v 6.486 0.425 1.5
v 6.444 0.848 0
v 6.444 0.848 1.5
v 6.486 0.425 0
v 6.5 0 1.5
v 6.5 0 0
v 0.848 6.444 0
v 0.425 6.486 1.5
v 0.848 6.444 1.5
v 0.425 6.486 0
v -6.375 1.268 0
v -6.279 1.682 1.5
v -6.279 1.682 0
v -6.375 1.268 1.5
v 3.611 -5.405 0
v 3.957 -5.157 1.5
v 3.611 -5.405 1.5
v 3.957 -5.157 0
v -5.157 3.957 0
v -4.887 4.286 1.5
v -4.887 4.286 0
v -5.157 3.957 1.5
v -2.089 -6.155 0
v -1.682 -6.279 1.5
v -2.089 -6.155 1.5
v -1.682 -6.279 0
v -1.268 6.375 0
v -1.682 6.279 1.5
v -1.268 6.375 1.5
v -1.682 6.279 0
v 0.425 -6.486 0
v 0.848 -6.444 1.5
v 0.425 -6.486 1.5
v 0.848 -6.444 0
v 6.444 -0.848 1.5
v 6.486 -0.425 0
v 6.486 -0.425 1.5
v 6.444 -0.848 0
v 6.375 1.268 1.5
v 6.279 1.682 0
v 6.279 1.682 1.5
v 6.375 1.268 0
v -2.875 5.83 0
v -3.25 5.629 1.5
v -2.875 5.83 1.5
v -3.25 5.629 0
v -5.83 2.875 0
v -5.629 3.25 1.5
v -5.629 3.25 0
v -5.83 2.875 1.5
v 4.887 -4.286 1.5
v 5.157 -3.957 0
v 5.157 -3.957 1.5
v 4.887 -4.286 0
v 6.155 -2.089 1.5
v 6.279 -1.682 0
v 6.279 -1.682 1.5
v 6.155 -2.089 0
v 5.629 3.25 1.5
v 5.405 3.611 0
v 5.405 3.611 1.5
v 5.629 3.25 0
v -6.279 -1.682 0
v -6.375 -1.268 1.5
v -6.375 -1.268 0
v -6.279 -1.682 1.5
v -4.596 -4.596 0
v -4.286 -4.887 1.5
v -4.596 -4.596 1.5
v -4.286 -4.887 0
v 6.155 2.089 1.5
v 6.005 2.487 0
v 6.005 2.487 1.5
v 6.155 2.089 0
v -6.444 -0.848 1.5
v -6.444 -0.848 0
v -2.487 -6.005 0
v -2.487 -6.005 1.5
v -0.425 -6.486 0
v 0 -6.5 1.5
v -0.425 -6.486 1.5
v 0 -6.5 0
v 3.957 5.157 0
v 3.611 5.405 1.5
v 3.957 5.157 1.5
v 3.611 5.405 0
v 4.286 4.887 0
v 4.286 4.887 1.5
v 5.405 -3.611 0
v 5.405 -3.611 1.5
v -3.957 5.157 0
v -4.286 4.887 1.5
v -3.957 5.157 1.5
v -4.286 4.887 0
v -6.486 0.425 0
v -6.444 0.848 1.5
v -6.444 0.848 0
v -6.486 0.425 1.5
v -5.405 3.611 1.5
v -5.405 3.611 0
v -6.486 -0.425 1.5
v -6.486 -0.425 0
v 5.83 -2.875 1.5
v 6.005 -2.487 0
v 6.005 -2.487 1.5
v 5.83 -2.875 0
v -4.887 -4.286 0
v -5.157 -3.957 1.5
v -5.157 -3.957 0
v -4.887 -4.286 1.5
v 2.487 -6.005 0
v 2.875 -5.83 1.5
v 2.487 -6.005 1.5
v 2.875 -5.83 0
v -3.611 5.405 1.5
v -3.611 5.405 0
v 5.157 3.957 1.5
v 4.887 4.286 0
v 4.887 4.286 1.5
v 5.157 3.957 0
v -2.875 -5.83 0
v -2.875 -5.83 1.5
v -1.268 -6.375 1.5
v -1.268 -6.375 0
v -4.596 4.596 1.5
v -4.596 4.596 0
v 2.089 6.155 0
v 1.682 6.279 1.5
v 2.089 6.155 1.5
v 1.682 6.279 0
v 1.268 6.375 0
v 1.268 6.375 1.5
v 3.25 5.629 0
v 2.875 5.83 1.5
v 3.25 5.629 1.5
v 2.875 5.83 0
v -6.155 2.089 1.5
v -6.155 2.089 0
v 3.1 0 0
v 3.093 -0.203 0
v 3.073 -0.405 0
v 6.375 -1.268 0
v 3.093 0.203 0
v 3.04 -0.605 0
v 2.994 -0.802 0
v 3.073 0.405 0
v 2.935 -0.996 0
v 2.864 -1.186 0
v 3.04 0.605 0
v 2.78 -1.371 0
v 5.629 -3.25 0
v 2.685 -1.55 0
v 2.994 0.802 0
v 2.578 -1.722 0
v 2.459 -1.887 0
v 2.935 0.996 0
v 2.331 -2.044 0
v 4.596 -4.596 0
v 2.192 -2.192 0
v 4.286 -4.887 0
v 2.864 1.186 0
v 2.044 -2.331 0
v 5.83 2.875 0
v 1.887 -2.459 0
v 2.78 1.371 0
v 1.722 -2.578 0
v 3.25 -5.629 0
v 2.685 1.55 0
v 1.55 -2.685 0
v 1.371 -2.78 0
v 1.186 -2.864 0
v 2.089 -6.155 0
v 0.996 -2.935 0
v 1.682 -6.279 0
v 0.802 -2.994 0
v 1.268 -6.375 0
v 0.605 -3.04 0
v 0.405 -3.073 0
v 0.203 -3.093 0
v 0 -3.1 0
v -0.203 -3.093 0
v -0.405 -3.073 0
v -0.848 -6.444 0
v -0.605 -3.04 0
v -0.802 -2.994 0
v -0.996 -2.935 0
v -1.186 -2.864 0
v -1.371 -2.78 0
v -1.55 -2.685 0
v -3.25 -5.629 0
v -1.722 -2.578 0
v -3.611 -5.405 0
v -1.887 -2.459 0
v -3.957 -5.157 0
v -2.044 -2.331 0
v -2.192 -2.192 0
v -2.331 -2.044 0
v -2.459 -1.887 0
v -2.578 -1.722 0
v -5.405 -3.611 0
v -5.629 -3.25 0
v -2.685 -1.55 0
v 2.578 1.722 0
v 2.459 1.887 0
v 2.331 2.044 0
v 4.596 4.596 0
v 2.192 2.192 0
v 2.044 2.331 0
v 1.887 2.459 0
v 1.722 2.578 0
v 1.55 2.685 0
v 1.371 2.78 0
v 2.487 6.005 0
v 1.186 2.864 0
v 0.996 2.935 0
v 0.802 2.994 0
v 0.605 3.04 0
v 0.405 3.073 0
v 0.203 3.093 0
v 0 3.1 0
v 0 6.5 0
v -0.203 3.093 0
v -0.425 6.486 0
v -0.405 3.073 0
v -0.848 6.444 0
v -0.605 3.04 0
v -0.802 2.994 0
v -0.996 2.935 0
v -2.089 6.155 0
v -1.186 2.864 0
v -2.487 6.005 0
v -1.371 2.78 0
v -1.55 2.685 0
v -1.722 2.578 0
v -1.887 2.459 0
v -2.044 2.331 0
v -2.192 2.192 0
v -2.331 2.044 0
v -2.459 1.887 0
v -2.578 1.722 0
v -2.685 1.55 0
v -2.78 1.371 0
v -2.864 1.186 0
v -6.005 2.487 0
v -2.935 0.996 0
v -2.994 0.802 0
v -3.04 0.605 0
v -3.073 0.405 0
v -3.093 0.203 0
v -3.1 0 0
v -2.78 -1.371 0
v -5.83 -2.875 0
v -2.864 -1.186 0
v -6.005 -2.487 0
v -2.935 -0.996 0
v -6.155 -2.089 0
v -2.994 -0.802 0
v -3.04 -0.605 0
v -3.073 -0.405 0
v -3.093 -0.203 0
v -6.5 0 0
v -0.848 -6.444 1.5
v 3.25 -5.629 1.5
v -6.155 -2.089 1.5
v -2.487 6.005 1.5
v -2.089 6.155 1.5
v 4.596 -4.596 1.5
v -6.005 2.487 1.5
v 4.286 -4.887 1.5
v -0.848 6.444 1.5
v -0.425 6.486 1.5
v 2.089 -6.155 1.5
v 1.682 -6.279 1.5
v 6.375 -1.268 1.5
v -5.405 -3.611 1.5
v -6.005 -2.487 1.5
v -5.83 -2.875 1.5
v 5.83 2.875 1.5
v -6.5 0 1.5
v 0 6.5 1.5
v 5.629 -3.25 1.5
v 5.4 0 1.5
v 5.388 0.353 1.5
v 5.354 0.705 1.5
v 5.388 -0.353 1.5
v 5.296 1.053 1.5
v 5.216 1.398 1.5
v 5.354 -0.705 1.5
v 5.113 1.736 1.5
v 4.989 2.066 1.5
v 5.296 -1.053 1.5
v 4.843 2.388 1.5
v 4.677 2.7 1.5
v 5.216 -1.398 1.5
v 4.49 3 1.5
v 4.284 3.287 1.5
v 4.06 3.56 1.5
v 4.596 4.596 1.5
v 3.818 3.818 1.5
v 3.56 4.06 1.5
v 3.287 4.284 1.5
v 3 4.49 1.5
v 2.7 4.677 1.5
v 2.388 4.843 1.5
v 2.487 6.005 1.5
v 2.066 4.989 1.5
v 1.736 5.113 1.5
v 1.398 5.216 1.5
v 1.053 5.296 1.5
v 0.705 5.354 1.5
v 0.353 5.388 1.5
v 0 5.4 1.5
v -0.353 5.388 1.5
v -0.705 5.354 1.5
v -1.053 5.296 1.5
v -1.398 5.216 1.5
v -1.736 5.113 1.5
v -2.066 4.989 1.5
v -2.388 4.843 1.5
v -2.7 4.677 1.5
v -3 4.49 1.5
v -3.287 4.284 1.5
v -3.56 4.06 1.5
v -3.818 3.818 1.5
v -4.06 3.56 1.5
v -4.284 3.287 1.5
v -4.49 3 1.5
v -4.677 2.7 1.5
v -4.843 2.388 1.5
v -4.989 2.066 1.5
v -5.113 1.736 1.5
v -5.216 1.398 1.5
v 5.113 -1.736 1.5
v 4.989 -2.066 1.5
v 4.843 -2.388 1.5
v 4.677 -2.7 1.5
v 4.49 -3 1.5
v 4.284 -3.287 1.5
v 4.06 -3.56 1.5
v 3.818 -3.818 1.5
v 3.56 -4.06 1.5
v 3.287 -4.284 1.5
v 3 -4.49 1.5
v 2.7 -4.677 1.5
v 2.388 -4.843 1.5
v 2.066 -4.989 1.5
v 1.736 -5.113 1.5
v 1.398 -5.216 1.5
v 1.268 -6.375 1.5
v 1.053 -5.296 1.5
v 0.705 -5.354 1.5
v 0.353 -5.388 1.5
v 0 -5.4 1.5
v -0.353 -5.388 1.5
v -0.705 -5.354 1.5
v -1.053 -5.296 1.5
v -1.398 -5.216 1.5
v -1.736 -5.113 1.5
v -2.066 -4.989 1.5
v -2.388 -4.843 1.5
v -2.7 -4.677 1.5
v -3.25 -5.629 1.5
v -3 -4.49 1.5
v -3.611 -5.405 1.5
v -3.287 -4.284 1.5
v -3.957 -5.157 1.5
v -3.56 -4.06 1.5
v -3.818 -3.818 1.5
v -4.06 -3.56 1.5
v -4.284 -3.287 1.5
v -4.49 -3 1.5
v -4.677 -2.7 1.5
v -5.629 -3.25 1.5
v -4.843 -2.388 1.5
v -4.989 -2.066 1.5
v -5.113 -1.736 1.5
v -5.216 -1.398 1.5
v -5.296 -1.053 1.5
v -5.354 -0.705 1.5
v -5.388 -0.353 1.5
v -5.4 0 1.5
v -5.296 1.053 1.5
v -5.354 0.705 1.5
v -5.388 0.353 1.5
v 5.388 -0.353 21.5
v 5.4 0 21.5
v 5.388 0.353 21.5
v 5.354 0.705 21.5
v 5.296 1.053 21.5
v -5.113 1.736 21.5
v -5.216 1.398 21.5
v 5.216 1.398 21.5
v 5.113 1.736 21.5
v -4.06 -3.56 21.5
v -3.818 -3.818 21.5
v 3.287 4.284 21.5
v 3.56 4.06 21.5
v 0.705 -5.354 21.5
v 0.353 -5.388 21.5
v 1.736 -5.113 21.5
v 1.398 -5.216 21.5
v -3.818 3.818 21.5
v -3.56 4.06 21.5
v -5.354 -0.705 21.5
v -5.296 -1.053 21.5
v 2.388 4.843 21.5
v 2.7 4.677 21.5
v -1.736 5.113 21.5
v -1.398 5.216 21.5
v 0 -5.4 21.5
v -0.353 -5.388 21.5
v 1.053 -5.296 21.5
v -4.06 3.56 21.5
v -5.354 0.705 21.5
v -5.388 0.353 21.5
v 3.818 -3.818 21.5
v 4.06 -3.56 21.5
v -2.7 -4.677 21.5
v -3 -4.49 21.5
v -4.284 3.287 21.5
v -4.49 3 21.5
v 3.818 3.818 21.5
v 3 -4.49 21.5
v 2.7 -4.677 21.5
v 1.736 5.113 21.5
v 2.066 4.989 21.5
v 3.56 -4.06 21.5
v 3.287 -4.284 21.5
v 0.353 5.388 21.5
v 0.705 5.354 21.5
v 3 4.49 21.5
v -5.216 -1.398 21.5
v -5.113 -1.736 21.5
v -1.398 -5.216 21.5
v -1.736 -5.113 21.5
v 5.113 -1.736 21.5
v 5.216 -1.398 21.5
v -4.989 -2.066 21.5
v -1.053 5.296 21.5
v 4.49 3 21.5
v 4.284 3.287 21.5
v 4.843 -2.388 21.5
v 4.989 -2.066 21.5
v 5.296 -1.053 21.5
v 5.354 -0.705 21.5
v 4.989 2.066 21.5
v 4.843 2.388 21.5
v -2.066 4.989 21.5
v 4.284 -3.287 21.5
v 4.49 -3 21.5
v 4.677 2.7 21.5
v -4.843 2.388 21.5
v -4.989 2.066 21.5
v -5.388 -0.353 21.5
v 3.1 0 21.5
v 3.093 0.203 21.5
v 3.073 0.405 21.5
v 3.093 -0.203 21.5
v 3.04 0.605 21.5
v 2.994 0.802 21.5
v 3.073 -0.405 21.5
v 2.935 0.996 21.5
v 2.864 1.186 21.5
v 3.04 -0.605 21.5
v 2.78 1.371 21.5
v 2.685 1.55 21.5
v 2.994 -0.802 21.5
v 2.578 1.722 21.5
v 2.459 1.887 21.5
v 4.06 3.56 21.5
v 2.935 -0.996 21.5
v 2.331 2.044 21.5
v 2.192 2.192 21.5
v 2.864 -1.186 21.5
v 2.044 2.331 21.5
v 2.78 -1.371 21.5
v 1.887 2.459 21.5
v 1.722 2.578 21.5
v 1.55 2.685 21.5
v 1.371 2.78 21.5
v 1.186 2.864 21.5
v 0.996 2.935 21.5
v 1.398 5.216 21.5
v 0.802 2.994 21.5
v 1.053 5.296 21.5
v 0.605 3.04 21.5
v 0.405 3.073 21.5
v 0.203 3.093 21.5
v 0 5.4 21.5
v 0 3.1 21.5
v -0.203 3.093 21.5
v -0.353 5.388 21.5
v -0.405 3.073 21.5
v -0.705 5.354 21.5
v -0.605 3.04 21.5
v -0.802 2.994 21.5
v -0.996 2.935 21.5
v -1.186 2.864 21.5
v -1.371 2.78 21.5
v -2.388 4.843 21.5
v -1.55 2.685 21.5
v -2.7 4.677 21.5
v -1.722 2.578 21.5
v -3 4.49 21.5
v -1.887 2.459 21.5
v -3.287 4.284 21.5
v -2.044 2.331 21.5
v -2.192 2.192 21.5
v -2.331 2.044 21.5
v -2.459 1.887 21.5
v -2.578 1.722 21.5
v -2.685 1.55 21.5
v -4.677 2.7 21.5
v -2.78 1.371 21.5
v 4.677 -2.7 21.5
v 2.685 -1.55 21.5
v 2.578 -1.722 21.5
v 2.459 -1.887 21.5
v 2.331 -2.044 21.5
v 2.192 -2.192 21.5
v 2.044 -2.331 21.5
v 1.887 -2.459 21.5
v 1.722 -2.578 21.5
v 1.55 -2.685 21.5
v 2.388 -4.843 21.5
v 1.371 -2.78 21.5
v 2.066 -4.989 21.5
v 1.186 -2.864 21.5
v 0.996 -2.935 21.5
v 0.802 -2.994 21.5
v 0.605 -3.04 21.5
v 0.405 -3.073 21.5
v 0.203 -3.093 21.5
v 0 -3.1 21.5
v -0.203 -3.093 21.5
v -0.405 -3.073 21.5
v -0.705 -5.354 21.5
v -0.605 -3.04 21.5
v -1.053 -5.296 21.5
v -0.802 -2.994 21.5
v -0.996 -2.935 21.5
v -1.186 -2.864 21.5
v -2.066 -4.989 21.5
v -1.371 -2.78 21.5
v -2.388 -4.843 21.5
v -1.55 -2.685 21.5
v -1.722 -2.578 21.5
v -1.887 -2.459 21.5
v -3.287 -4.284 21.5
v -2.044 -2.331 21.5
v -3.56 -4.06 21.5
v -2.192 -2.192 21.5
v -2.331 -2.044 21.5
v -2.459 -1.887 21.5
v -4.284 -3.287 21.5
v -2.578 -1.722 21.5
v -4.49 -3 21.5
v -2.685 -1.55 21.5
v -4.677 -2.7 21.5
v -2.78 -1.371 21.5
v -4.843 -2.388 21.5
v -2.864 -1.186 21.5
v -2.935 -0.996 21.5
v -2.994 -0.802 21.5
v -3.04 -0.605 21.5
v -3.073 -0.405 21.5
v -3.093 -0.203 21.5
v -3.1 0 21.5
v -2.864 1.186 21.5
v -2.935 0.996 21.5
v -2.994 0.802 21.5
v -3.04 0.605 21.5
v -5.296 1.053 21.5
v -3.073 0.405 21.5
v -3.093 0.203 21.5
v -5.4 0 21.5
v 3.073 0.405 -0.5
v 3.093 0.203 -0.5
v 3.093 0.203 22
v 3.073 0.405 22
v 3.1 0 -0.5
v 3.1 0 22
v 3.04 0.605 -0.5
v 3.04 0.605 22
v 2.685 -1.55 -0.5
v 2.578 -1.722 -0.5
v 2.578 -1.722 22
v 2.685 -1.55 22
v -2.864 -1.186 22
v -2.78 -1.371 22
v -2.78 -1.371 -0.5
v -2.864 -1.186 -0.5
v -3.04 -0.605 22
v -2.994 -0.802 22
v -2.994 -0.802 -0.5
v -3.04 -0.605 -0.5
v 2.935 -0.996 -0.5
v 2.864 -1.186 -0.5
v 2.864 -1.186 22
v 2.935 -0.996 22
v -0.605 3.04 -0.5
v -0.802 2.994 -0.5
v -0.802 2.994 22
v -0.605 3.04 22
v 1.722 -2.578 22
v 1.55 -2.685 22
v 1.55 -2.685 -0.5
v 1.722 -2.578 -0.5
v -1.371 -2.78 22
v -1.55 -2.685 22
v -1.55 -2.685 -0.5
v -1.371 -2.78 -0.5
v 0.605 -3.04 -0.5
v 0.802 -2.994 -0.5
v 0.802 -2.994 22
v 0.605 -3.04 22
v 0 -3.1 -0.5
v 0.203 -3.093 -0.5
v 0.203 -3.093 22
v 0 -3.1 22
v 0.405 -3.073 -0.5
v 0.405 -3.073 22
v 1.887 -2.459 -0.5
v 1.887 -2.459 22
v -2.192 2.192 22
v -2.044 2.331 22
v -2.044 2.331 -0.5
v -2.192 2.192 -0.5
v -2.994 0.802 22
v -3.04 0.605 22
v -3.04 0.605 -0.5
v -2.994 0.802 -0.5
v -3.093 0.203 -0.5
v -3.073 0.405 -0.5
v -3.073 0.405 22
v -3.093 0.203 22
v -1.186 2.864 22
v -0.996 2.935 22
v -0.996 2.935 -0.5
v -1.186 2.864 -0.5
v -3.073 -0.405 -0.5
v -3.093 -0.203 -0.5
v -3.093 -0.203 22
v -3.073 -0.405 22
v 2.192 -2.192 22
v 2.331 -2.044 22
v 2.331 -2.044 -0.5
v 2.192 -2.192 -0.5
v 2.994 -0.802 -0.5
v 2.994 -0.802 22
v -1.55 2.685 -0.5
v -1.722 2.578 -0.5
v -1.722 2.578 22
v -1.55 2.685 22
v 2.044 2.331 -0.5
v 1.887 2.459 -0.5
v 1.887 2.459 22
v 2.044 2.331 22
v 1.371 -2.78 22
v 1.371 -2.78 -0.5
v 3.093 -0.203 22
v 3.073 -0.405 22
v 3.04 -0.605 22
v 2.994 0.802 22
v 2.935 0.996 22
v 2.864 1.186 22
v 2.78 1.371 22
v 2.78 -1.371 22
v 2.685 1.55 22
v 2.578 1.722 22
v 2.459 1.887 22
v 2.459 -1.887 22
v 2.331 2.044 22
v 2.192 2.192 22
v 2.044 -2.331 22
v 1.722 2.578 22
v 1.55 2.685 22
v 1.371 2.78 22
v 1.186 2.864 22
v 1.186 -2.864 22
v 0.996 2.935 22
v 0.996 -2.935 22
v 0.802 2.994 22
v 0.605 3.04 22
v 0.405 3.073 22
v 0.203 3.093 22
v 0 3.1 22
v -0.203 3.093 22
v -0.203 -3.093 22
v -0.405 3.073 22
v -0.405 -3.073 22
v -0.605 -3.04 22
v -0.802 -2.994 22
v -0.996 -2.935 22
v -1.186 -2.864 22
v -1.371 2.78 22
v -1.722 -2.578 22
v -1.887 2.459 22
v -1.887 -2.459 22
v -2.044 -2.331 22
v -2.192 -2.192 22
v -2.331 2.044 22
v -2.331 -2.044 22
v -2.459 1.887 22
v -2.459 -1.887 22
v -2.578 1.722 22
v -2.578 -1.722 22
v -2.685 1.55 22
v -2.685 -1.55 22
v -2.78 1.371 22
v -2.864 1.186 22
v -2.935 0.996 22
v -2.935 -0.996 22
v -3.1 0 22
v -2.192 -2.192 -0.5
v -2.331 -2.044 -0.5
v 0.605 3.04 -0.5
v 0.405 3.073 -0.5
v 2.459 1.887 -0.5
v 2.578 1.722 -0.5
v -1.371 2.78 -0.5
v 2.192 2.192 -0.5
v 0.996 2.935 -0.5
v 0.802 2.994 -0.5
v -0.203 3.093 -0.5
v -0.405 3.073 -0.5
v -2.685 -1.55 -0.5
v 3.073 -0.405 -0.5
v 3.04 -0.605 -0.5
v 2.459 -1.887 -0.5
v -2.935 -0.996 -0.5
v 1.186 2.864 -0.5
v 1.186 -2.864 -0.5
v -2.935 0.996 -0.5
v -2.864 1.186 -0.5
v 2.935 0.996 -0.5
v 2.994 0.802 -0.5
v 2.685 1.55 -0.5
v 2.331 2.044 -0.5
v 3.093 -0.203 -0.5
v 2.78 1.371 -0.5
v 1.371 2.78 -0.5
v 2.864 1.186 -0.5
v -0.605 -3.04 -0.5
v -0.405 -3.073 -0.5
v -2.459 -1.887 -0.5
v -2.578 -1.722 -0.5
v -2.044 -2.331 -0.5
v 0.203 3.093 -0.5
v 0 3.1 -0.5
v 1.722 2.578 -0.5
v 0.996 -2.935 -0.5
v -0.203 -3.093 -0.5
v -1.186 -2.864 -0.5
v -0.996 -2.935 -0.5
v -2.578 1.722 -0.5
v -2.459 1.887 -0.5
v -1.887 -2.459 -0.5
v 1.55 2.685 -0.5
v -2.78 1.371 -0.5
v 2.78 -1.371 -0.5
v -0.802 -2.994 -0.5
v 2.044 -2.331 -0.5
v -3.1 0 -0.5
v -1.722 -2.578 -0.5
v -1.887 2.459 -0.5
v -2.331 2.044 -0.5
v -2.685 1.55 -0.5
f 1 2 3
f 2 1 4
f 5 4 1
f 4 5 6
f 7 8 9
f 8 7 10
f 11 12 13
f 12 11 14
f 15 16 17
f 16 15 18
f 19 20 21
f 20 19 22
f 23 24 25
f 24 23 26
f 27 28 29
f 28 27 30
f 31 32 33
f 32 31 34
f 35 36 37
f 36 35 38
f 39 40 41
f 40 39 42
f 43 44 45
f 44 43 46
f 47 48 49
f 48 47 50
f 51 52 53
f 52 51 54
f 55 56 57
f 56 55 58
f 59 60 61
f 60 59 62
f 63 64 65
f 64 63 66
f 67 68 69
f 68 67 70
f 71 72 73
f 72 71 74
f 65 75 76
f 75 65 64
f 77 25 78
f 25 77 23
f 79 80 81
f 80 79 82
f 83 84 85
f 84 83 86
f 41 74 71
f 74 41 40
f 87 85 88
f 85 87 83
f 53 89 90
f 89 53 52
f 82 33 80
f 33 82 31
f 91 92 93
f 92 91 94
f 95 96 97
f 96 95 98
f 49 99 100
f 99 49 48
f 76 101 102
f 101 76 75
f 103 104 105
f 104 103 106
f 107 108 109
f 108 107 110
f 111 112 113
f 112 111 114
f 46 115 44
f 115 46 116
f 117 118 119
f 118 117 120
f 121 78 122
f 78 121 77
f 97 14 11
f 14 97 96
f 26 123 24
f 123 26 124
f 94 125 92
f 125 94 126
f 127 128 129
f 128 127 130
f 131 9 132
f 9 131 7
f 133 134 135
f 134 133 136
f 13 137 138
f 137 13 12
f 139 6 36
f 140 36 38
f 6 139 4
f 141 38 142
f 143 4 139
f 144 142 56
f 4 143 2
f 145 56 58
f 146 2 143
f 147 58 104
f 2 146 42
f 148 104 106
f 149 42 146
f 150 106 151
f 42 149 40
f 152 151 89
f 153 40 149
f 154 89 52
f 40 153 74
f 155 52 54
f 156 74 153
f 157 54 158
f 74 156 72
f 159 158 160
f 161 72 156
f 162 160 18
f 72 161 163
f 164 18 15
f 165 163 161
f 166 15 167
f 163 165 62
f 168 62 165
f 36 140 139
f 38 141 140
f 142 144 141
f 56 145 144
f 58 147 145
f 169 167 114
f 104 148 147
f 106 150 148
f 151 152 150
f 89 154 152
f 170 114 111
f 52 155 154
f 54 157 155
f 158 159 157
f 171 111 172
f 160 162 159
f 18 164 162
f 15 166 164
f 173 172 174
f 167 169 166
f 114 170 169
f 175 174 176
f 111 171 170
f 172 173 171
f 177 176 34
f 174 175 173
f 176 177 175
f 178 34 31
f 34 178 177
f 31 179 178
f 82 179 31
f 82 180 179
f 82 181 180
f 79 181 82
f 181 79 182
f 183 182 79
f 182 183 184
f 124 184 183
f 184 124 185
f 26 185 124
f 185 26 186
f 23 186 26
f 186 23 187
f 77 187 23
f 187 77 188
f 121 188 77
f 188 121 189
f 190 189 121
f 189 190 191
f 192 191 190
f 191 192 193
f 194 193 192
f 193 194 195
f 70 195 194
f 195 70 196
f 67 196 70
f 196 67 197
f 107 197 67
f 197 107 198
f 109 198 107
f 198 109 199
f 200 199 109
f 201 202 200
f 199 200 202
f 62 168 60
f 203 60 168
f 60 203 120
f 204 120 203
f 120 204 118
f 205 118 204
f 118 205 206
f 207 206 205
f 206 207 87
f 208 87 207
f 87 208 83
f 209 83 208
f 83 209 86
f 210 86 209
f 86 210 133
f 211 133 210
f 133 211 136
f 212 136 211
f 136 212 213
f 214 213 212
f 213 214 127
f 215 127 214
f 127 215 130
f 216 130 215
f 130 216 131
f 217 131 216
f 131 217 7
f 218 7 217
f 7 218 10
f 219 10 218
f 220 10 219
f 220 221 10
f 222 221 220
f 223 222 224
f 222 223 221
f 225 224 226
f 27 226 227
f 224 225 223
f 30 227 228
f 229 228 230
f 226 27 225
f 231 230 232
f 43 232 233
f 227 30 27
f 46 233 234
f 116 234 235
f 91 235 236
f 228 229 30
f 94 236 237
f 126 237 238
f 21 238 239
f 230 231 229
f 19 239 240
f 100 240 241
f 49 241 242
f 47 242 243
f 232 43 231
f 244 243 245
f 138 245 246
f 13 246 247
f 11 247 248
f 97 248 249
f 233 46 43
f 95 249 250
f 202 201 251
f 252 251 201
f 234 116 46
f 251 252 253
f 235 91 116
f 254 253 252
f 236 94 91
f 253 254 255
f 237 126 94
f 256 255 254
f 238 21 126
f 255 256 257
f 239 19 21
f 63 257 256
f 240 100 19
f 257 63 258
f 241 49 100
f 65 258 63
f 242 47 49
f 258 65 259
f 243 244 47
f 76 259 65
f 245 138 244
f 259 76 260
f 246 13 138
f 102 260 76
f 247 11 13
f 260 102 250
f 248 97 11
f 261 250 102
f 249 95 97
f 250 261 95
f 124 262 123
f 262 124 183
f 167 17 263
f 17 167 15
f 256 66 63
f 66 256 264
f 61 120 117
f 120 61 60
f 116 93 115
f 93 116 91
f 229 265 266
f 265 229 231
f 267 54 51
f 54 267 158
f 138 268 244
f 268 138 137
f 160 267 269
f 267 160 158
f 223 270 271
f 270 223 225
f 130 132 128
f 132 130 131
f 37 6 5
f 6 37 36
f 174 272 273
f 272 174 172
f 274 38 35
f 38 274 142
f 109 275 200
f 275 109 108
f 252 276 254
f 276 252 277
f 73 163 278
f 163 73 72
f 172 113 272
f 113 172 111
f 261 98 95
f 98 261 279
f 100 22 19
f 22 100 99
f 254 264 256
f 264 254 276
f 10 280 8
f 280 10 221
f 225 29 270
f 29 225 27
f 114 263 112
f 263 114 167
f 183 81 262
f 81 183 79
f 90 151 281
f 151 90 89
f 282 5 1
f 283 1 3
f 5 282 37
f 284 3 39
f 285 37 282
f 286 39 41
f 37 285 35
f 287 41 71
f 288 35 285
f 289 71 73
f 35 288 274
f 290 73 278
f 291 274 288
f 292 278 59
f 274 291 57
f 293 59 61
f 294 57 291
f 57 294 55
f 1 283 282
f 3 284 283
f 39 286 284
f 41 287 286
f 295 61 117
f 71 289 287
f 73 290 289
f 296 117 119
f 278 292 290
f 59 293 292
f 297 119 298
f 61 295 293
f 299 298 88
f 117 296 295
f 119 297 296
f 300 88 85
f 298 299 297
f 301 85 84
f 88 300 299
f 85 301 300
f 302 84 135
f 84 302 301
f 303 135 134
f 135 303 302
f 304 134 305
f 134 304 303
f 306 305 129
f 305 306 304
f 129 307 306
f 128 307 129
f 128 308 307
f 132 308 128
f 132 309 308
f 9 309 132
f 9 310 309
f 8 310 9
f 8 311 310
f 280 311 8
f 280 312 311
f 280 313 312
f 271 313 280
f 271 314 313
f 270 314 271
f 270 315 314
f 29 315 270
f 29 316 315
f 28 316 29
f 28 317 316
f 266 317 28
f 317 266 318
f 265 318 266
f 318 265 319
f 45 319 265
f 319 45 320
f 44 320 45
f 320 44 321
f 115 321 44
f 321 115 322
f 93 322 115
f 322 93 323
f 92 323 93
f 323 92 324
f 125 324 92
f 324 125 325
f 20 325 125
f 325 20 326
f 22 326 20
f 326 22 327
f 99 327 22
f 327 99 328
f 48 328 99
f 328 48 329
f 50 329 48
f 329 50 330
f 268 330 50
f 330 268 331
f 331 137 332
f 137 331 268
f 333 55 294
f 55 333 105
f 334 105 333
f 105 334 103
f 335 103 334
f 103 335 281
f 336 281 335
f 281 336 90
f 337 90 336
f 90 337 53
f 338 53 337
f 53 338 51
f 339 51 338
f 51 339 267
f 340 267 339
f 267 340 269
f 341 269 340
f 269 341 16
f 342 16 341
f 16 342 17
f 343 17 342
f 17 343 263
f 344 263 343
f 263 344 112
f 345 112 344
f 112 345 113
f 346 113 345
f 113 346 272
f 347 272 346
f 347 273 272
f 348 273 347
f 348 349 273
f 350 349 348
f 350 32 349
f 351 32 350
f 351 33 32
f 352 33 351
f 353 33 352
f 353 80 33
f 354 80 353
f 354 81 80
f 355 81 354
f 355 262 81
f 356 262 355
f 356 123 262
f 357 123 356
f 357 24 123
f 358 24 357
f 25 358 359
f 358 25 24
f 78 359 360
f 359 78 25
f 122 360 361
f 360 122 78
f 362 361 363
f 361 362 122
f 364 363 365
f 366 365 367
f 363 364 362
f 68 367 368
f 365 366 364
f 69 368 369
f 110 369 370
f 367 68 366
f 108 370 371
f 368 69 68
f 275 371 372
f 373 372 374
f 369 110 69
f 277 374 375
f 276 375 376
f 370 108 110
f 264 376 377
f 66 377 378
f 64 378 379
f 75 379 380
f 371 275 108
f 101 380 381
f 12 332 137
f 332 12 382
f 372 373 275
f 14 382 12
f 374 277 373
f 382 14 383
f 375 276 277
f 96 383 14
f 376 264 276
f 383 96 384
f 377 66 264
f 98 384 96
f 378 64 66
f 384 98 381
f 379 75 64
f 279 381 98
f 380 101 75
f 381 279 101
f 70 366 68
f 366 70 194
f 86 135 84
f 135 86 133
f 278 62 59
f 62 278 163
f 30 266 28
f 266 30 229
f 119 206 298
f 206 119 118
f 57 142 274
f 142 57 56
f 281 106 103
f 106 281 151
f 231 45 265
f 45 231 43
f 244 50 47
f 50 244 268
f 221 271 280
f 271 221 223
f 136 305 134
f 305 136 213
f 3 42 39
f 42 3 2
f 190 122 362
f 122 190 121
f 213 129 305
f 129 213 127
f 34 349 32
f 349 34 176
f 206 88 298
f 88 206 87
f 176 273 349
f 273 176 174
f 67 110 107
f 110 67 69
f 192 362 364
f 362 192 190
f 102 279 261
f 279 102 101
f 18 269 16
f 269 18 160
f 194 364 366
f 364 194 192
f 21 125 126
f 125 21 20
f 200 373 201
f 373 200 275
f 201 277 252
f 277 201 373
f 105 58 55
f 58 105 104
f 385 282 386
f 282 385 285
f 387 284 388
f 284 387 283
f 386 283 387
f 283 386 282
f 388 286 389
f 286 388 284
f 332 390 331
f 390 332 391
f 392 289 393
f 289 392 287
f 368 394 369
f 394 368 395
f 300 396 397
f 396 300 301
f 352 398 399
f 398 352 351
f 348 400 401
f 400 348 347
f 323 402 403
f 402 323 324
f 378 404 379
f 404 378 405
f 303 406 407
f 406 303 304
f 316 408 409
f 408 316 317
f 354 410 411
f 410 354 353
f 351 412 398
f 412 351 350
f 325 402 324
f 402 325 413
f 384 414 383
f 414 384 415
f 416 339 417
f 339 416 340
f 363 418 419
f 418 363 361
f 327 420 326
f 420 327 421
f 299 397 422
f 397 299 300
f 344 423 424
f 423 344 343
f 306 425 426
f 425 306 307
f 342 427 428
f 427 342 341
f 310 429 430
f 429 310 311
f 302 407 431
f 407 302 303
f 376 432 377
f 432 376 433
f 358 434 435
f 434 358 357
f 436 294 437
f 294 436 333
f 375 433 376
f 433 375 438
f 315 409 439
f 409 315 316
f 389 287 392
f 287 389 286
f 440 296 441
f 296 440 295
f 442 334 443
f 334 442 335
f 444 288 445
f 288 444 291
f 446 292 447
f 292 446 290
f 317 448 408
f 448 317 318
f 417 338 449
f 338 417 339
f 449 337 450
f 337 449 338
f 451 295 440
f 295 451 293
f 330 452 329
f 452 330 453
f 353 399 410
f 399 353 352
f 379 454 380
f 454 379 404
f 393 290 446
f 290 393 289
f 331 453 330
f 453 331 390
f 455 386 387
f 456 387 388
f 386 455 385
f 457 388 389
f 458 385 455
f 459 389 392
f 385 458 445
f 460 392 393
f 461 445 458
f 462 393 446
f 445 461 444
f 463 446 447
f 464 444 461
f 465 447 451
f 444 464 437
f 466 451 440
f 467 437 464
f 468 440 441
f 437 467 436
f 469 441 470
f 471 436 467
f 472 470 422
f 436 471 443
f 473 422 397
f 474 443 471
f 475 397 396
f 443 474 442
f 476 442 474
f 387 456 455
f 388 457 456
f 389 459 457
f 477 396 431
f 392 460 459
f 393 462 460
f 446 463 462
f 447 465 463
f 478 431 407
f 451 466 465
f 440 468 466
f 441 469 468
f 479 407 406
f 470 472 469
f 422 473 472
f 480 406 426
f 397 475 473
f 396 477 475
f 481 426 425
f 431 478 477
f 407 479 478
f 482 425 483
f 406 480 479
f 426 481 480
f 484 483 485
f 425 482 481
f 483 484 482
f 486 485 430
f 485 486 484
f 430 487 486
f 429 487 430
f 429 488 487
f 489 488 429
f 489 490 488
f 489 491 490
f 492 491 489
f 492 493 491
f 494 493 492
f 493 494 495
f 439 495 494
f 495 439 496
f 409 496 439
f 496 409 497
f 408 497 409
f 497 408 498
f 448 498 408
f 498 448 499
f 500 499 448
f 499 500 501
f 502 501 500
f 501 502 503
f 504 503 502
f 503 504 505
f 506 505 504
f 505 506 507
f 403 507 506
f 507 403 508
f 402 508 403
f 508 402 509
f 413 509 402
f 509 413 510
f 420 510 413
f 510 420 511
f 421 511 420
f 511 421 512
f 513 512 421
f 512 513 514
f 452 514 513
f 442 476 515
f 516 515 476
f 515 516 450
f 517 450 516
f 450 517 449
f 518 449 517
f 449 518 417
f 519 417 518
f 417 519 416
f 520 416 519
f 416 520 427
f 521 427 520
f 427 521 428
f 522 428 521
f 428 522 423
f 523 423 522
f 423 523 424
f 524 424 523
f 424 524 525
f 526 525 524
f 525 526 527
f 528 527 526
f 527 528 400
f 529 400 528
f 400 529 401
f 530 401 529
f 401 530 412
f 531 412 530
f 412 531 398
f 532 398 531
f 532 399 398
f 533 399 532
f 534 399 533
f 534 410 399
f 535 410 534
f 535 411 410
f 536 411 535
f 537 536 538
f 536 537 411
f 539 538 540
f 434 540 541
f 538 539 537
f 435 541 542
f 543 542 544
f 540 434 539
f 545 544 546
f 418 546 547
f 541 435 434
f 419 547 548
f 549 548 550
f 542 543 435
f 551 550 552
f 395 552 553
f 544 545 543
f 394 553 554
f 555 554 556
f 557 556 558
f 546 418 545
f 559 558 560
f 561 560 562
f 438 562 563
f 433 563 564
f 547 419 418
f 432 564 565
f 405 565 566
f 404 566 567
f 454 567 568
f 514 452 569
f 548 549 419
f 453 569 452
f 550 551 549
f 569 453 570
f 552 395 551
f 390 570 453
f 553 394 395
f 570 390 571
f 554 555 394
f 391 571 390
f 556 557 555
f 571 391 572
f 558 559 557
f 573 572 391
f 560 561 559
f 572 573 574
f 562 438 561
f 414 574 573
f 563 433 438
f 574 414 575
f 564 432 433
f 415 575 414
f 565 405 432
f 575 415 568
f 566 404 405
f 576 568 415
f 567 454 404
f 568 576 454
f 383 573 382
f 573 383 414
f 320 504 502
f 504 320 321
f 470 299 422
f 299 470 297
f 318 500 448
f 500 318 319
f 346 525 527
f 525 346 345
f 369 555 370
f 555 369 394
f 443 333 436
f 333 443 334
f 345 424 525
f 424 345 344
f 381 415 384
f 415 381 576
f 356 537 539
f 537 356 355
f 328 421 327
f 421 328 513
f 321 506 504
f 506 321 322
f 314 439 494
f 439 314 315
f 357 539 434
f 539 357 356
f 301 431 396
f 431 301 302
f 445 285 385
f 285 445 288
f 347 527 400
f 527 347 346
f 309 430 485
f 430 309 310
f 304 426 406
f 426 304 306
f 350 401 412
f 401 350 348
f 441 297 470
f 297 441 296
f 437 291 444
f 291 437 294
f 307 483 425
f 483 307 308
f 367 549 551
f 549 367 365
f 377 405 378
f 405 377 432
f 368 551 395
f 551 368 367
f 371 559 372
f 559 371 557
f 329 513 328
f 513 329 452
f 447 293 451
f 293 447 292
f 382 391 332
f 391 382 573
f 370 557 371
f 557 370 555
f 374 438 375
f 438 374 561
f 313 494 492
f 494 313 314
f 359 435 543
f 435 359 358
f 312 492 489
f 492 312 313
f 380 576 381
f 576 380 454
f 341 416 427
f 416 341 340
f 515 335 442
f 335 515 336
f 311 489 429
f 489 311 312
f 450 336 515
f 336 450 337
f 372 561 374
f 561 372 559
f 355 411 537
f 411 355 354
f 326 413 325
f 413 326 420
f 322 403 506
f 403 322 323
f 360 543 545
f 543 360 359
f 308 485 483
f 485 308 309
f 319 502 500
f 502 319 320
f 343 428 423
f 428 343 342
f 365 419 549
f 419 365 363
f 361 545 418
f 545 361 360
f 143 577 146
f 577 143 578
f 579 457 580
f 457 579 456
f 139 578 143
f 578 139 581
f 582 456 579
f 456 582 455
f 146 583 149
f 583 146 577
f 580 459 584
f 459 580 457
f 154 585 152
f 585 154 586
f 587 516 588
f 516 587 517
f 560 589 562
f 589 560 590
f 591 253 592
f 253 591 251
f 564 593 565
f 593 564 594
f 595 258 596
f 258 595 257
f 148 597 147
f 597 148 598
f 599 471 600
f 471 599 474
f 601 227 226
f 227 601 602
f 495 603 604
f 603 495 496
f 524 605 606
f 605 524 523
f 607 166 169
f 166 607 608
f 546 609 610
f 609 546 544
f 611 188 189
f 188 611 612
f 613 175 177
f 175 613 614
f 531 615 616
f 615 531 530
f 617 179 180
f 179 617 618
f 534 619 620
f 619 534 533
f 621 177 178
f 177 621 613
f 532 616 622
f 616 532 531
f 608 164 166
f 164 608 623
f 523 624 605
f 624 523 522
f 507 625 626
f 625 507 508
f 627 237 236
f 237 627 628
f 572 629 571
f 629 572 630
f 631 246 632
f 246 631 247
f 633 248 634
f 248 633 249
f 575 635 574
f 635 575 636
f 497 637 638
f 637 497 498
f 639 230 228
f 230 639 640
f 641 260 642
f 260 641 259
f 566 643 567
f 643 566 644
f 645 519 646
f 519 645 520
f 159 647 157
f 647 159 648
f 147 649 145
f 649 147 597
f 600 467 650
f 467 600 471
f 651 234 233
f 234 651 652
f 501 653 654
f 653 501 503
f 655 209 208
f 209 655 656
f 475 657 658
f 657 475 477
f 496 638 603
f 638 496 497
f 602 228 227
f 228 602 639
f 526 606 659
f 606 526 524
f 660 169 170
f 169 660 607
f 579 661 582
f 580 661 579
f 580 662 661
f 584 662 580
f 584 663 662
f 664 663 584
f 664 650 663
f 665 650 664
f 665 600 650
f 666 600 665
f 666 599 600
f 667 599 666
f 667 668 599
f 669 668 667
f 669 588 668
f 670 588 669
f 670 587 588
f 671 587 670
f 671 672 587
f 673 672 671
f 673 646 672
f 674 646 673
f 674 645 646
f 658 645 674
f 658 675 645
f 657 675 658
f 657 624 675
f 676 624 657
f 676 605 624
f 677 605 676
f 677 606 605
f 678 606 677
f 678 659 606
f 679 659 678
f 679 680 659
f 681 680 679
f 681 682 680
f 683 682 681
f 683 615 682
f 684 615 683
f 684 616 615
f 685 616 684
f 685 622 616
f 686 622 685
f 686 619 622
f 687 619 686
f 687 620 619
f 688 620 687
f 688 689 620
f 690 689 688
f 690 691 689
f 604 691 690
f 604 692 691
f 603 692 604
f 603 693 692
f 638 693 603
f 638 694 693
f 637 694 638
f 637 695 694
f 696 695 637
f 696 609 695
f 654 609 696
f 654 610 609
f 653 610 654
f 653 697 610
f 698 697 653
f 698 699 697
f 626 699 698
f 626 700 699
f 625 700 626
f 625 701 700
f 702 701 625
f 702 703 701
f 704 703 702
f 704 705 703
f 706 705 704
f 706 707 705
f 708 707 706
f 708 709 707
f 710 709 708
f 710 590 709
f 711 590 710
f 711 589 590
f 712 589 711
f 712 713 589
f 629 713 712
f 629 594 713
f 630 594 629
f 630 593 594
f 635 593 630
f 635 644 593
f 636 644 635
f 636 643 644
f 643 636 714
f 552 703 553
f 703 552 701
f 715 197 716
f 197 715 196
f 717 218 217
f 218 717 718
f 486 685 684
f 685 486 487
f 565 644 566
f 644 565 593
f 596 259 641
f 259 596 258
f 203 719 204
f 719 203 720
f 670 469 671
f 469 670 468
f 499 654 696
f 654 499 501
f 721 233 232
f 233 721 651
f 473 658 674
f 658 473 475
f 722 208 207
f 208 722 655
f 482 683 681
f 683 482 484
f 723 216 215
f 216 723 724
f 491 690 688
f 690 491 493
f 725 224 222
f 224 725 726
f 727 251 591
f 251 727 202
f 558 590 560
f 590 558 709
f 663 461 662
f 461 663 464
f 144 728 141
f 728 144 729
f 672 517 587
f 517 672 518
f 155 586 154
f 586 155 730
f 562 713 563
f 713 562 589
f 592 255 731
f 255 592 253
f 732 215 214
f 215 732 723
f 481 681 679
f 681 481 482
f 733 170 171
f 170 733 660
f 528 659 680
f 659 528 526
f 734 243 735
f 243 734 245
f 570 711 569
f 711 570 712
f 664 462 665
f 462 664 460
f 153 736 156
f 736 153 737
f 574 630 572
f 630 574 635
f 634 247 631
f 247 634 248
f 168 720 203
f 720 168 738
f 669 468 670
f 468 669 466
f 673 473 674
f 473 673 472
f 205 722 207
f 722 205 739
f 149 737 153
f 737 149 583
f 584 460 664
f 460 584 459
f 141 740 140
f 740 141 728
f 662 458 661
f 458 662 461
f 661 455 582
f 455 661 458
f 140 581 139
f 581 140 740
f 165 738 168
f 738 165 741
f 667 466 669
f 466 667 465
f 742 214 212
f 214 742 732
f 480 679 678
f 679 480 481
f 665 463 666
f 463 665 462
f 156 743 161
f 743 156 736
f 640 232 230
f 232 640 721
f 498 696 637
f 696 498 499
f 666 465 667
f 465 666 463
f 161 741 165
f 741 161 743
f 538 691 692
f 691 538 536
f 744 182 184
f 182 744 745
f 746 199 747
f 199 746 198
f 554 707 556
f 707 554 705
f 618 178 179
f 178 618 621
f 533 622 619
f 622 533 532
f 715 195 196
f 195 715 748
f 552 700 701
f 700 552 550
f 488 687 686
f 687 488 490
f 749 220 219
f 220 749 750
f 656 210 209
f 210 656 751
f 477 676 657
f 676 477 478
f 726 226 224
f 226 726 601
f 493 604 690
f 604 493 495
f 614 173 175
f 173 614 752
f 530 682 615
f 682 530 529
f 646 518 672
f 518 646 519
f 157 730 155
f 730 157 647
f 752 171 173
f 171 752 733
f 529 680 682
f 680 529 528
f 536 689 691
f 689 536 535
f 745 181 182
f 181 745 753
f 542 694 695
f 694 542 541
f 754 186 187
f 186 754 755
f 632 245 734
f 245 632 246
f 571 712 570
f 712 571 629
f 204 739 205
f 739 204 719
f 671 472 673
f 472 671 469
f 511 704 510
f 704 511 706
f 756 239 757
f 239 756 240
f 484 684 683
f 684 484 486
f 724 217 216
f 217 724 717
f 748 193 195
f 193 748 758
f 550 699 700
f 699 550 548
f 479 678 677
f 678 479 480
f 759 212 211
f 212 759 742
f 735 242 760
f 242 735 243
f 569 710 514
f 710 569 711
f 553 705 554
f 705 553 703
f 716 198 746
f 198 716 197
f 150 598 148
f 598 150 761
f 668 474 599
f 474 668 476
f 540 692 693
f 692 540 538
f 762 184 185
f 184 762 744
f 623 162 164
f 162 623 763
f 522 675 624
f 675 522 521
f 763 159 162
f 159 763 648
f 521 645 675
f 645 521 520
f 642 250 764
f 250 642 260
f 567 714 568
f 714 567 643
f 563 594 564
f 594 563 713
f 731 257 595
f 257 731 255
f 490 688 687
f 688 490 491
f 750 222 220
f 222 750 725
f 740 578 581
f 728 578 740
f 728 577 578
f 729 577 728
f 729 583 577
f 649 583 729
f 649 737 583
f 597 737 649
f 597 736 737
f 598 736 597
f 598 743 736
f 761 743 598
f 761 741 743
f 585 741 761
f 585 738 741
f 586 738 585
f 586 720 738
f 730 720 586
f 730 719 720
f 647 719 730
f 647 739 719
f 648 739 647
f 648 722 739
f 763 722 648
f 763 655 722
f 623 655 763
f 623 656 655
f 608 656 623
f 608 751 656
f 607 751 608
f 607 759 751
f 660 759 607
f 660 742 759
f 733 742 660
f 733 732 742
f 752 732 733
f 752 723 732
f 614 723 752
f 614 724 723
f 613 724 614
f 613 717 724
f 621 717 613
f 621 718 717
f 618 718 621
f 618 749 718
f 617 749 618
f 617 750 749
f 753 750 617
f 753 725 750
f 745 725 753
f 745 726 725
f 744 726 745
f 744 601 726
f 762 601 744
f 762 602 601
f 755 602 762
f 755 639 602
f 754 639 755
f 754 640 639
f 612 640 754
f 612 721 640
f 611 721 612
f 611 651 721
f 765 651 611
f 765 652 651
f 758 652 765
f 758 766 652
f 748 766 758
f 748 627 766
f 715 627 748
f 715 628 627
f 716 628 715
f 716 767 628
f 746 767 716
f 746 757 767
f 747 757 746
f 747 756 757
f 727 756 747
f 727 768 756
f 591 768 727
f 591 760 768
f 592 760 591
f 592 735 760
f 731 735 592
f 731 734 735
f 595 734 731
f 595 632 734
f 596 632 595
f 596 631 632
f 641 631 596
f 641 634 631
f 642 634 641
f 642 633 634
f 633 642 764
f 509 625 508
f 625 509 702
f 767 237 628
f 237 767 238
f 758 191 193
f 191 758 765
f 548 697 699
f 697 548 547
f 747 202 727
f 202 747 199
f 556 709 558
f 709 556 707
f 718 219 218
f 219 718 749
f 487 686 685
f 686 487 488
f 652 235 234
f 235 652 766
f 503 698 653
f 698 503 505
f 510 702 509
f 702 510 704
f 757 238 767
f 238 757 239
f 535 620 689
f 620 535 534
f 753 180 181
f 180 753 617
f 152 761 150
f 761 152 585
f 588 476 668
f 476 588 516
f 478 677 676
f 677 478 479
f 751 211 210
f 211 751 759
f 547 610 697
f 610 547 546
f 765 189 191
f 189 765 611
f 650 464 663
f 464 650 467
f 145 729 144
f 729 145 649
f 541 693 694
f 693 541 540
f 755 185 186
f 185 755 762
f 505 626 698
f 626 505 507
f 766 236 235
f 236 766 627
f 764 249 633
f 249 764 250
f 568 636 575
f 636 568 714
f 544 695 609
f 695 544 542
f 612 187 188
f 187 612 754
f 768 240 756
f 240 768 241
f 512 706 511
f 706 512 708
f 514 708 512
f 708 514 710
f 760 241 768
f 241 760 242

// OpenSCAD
// PCR tube adapter sleeve: fits a 0.2 mL tube in a 1.5 mL rack hole
// Print orientation: collar on bed (z = 0), sleeve body rises to top

// ---------- Parameters ----------
collar_d        = 13;     // collar outer diameter
collar_t        = 1.5;    // collar thickness (z = 0 to 1.5)
sleeve_od       = 10.8;   // sleeve body outer diameter
sleeve_h        = 20;     // sleeve body height above collar (z = 1.5 to 21.5)
bore_d          = 6.2;    // through-bore diameter
eps             = 0.5;    // cutter overshoot past faces
$fn             = 96;     // curve resolution

// ---------- Model ----------
union() {
    // Collar
    cylinder(d = collar_d, h = collar_t);

    // Sleeve body (slightly overlapping the collar for a clean union)
    translate([0, 0, collar_t - 0.01])
        cylinder(d = sleeve_od, h = sleeve_h + 0.01);

    // Through bore
    translate([0, 0, -eps])
        cylinder(d = bore_d, h = collar_t + sleeve_h + 2 * eps);
}
